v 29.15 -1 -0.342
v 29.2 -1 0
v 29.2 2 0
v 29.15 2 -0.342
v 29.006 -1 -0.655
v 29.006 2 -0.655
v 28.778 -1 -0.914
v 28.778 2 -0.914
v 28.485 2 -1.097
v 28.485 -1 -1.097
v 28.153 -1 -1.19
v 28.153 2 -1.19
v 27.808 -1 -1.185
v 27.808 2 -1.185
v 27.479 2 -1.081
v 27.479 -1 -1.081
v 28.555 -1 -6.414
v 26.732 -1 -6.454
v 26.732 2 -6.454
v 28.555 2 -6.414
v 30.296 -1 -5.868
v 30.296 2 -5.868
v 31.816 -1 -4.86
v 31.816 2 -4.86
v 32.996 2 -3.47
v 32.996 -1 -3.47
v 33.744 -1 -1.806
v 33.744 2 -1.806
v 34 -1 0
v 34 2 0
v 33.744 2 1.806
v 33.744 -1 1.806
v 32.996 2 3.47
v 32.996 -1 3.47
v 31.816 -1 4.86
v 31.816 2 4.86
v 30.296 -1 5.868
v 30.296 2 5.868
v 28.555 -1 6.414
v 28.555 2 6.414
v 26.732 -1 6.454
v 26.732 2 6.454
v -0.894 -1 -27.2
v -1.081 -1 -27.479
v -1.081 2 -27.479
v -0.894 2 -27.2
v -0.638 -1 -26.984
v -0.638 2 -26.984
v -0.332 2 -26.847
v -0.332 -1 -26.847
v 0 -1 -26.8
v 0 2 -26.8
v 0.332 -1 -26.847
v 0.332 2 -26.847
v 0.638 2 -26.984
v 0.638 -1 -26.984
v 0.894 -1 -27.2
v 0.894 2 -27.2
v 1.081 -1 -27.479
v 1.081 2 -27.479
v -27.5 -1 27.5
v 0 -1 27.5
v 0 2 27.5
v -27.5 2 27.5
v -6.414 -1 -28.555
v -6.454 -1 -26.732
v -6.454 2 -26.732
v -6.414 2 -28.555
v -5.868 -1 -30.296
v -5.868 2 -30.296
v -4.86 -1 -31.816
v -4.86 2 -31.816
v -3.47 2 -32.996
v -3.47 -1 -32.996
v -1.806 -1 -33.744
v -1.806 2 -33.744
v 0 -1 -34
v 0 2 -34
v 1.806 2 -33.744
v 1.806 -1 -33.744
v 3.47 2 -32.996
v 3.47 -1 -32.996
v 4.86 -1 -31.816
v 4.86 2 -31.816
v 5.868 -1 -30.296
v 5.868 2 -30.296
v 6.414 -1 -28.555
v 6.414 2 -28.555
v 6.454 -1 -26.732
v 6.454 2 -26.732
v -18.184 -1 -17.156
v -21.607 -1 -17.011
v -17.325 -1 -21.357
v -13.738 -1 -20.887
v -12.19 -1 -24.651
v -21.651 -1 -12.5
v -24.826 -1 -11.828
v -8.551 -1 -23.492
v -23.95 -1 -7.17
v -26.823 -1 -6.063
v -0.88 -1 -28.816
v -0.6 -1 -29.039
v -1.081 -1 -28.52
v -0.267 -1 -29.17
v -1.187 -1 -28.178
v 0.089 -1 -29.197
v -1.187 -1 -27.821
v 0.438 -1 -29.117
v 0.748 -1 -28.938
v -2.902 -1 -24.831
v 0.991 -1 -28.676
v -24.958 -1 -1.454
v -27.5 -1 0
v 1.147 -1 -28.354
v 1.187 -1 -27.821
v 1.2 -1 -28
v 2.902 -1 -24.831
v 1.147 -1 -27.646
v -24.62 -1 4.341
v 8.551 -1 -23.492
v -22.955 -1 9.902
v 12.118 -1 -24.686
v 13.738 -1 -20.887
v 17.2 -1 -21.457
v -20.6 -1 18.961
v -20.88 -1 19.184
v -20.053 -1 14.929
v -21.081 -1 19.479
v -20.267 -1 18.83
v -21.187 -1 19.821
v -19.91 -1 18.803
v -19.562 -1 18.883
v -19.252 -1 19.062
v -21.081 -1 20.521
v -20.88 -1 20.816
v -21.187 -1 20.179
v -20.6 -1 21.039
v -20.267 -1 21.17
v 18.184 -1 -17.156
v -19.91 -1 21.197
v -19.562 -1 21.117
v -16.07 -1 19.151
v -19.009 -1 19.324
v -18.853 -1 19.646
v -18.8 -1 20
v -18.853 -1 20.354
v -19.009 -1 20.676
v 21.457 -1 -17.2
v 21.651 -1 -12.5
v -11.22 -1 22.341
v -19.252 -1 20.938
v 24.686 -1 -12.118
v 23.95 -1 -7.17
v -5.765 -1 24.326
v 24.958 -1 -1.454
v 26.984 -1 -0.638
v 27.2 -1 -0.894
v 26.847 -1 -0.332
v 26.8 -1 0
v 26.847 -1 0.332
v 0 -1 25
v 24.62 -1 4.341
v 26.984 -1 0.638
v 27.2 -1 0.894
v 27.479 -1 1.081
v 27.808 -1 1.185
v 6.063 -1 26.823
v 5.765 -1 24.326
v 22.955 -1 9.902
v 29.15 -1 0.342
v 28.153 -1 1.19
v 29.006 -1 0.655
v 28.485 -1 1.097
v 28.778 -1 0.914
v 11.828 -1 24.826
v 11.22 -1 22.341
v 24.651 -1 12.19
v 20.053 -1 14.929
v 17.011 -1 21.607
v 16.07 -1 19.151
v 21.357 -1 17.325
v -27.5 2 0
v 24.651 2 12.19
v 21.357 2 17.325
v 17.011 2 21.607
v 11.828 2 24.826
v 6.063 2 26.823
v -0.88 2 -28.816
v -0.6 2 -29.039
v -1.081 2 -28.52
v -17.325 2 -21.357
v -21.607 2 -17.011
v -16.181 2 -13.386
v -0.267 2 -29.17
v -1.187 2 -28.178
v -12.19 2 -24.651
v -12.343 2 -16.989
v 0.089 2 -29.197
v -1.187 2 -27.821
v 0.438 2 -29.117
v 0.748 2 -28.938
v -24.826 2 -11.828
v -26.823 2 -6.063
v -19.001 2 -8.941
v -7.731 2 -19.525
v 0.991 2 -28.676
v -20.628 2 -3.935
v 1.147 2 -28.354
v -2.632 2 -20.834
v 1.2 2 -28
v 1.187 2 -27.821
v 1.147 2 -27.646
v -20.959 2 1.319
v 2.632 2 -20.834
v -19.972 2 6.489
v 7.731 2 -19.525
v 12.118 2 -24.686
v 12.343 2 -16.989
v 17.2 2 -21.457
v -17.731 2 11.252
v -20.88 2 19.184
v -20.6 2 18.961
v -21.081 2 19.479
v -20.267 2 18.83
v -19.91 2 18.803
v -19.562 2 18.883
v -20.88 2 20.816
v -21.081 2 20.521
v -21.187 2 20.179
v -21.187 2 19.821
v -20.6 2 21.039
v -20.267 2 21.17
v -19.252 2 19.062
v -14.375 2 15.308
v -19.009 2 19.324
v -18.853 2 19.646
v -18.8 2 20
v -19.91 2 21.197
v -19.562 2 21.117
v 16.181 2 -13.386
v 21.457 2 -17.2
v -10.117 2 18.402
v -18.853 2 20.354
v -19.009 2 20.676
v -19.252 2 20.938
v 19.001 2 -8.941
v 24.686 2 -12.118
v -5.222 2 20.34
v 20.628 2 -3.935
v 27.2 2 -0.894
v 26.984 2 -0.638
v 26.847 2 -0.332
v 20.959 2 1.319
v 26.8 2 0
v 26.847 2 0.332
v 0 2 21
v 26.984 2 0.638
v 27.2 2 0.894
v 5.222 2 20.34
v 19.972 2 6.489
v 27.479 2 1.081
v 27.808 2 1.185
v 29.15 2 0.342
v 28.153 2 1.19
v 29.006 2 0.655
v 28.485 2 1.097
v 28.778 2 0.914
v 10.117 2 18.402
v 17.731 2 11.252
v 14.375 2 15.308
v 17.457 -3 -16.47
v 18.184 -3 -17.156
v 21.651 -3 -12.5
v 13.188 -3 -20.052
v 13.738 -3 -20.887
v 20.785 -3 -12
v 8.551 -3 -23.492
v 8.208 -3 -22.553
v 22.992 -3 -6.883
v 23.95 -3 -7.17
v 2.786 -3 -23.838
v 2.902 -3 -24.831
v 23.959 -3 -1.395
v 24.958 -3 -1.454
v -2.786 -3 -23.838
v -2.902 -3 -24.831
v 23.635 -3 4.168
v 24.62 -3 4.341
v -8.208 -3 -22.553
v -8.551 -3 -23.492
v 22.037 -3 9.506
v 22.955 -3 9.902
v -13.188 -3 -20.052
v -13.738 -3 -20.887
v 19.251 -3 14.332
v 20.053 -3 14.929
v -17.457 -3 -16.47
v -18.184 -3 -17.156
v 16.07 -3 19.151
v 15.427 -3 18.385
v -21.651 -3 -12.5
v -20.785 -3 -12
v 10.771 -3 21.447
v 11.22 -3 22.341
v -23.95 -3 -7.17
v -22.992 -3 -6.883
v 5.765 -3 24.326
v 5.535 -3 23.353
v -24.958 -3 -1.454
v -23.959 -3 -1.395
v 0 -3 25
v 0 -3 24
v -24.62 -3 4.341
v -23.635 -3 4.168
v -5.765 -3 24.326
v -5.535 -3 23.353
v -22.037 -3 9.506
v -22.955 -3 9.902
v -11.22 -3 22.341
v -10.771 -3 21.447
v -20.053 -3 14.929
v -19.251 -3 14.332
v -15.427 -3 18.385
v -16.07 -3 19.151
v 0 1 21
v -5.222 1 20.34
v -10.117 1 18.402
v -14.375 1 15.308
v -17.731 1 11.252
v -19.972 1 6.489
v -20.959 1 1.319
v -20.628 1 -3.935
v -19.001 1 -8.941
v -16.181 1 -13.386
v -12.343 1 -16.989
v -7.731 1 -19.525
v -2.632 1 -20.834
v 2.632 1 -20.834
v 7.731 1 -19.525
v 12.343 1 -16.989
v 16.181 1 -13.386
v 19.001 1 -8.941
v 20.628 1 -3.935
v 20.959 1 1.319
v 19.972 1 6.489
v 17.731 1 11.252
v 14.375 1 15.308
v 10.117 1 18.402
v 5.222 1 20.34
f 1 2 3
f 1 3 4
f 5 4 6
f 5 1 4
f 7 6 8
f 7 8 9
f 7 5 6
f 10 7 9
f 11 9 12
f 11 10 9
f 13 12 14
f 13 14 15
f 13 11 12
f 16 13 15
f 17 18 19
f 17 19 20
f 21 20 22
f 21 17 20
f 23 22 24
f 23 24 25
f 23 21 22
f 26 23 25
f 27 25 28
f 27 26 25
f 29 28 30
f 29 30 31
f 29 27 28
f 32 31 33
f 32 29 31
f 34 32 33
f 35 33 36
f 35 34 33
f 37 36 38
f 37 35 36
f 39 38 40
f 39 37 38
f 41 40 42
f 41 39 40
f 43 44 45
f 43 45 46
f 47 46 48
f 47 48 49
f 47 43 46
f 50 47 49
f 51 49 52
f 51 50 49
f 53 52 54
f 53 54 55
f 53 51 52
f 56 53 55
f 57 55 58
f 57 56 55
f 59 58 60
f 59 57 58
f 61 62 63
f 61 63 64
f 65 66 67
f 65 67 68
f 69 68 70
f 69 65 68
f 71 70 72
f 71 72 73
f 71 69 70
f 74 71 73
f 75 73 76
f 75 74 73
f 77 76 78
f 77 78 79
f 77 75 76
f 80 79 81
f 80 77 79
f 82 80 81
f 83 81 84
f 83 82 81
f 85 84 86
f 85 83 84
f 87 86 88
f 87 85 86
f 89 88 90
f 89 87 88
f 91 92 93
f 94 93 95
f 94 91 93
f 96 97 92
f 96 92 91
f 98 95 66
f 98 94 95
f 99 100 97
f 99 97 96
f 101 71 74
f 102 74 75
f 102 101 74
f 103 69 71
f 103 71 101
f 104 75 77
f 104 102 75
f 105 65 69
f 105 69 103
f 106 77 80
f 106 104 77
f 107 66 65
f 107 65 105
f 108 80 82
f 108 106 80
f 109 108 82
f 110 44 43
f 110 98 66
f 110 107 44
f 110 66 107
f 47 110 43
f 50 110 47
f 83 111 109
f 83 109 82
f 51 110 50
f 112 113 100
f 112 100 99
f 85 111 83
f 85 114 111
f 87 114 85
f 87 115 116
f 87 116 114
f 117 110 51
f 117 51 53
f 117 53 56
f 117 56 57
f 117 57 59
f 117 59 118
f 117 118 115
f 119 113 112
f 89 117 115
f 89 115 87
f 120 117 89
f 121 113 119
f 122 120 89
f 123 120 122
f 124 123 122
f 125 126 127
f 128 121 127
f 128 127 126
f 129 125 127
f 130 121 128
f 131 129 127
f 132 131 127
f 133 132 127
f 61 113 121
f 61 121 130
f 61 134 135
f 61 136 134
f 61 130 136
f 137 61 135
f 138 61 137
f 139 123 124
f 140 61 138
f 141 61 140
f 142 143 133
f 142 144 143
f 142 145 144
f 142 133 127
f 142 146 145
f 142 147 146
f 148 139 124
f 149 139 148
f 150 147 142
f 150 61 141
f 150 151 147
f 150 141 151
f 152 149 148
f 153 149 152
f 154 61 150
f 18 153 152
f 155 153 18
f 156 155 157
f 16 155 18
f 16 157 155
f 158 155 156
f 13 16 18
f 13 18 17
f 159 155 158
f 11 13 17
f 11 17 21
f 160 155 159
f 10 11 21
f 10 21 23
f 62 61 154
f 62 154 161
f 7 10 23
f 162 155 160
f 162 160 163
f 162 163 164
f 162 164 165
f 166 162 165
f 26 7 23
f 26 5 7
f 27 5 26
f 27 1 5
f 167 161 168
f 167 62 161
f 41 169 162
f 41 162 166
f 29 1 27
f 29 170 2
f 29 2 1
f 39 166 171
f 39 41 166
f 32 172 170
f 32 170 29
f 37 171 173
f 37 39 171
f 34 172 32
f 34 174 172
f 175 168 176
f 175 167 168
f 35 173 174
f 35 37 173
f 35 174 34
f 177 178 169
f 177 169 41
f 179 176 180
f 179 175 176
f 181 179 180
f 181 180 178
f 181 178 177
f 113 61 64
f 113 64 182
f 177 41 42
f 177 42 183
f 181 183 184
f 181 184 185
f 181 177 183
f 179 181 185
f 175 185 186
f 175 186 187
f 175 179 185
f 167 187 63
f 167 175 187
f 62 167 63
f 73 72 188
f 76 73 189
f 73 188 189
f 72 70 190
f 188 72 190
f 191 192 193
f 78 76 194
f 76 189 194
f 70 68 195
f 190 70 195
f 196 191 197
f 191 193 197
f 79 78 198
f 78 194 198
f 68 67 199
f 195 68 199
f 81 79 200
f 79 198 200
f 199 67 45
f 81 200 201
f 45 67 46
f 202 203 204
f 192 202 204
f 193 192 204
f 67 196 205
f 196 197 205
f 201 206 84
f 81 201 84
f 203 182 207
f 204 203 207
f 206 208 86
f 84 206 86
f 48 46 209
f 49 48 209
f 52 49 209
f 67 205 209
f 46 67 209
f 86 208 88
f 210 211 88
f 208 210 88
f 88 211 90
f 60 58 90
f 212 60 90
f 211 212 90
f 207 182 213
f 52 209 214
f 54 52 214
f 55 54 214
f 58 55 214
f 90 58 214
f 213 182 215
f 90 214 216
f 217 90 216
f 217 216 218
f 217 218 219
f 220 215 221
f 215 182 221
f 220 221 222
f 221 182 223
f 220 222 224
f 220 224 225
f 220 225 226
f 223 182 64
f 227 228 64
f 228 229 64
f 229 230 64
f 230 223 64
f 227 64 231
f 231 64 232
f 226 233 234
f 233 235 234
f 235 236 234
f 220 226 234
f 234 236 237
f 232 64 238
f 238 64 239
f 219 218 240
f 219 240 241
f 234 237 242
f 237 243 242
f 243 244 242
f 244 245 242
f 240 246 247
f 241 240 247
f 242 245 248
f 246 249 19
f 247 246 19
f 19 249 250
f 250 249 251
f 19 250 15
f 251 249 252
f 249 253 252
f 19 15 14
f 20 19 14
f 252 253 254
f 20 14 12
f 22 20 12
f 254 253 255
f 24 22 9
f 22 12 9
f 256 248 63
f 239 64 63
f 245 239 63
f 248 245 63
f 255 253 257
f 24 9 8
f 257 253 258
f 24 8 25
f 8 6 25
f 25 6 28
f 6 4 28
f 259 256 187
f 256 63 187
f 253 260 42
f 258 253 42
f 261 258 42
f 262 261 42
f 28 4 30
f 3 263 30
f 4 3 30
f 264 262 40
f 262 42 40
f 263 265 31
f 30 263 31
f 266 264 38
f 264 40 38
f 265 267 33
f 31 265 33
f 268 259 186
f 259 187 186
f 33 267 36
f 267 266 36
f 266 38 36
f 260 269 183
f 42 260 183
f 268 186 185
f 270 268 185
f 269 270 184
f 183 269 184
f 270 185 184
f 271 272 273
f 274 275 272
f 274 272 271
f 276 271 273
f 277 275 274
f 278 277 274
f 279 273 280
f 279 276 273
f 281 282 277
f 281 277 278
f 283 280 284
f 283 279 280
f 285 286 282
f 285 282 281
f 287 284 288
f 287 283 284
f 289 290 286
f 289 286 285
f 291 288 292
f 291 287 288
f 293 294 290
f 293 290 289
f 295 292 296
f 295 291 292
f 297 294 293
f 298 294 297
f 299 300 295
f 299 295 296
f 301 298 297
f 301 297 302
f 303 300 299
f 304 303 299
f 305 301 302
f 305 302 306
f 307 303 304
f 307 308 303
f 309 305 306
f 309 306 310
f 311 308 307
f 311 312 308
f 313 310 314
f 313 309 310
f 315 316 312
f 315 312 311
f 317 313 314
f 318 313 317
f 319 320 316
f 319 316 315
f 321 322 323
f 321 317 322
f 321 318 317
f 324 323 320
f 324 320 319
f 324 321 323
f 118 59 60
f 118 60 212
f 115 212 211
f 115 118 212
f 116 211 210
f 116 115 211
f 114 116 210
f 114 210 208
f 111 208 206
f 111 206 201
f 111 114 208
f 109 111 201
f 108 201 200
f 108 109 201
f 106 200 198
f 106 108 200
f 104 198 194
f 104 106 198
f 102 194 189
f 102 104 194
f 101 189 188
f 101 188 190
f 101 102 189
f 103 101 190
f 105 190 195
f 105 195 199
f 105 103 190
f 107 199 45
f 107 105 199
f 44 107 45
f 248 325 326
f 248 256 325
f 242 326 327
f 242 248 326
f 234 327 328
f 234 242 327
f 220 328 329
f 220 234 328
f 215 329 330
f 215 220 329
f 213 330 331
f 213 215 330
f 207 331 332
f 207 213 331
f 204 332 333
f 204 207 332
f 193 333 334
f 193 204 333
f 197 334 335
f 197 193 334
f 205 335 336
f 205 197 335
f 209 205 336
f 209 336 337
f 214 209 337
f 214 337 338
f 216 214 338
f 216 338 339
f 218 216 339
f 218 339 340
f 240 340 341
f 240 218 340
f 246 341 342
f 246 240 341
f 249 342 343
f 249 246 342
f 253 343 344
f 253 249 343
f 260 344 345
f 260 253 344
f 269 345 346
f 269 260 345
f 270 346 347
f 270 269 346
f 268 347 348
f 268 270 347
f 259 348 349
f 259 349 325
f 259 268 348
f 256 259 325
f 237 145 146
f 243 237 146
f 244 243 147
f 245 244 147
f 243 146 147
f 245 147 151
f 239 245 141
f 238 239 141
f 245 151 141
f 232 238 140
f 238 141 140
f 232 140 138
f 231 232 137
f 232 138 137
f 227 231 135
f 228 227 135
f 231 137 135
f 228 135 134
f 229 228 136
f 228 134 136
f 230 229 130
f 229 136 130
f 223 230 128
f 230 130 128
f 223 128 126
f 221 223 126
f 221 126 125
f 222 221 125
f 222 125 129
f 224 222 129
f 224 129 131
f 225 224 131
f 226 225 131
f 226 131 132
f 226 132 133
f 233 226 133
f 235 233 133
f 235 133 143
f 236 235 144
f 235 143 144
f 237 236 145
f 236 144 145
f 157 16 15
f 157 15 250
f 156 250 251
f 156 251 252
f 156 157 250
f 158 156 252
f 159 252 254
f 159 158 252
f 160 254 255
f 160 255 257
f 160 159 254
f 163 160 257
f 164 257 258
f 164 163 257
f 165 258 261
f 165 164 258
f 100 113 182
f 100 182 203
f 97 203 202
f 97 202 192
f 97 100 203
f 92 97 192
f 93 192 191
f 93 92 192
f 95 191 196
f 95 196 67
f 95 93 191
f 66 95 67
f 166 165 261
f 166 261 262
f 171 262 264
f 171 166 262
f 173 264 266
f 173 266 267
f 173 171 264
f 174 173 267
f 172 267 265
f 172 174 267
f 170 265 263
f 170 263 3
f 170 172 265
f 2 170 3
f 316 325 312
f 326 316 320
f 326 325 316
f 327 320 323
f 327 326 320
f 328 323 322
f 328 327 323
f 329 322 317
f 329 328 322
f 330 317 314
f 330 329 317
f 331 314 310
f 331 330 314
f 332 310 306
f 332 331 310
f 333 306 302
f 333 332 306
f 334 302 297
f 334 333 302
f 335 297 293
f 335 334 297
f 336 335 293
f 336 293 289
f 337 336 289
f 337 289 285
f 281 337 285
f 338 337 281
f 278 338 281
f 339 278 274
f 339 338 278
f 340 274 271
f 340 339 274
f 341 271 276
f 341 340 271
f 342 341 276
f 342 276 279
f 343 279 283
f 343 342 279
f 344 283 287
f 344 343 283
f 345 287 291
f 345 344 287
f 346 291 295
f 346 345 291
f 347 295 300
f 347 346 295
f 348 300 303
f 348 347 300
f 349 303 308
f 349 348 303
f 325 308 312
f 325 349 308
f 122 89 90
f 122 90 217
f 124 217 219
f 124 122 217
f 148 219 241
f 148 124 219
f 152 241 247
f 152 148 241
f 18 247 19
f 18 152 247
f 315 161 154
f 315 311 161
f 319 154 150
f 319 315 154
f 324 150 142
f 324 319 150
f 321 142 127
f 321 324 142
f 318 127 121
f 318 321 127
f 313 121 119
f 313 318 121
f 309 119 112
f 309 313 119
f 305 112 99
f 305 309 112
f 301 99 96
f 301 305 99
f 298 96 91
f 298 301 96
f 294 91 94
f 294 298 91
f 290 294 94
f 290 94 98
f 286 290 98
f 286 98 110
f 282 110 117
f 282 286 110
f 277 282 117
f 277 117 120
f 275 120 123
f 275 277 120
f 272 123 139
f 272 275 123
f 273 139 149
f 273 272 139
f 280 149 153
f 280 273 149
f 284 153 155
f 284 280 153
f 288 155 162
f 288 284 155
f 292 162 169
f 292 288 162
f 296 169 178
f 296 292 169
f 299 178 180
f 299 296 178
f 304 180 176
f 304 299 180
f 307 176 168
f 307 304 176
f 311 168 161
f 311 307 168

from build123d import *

# Parameters (mm, degrees)
F3_R     = 25
F3_R_2   = 1.2
F4_DEPTH = 3


with BuildPart() as f1:
    # F0 (on Right) → F1 (revolve)
    with BuildSketch(Plane.YZ):
        Polygon((2, 25), (-3, 25), (-3, 24), (1, 21), (2, 21), align=None)
    revolve(axis=Axis((0, 1.602868, 0), (0, -1, 0)))

    # F3 (on offset) → F4 (join)
    with BuildSketch(Plane.XZ.offset(1)):
        with BuildLine():
            ThreePointArc((26.731818, 6.454448), (17.011065, 21.607259), (0, 27.5))
            Line((0, 27.5), (-27.5, 27.5))
            Line((-27.5, 27.5), (-27.5, 0))
            ThreePointArc((-27.5, 0), (-21.607259, -17.011065), (-6.454448, -26.731818))
            ThreePointArc((-6.454448, -26.731818), (-3.786128, -27.238121), (-1.080879, -27.47875))
            ThreePointArc((-1.080879, -27.47875), (0, -26.8), (1.080879, -27.47875))
            ThreePointArc((1.080879, -27.47875), (3.786128, -27.238121), (6.454448, -26.731818))
            ThreePointArc((6.454448, -26.731818), (19.445436, -19.445436), (26.731818, -6.454448))
            ThreePointArc((26.731818, -6.454448), (27.238121, -3.786128), (27.47875, -1.080879))
            ThreePointArc((27.47875, -1.080879), (26.8, 0), (27.47875, 1.080879))
            ThreePointArc((27.47875, 1.080879), (27.238121, 3.786128), (26.731818, 6.454448))
        make_face()
        Circle(F3_R, mode=Mode.SUBTRACT)
        with Locations((-20, 20)):
            Circle(F3_R_2, mode=Mode.SUBTRACT)
        with BuildLine():
            ThreePointArc((26.731818, -6.454448), (34, 0), (26.731818, 6.454448))
            ThreePointArc((26.731818, 6.454448), (27.238121, 3.786128), (27.47875, 1.080879))
            ThreePointArc((27.47875, 1.080879), (28.638161, 1.016243), (29.2, 0))
            ThreePointArc((29.2, 0), (28.638161, -1.016243), (27.47875, -1.080879))
            ThreePointArc((27.47875, -1.080879), (27.238121, -3.786128), (26.731818, -6.454448))
        make_face()
        with BuildLine():
            ThreePointArc((-1.080879, -27.47875), (-3.786128, -27.238121), (-6.454448, -26.731818))
            ThreePointArc((-6.454448, -26.731818), (0, -34), (6.454448, -26.731818))
            ThreePointArc((6.454448, -26.731818), (3.786128, -27.238121), (1.080879, -27.47875))
            ThreePointArc((1.080879, -27.47875), (1.169841, -27.732656), (1.2, -28))
            ThreePointArc((1.2, -28), (-0.267344, -29.169841), (-1.080879, -27.47875))
        make_face()
    extrude(amount=-F4_DEPTH)


solid = f1.part
